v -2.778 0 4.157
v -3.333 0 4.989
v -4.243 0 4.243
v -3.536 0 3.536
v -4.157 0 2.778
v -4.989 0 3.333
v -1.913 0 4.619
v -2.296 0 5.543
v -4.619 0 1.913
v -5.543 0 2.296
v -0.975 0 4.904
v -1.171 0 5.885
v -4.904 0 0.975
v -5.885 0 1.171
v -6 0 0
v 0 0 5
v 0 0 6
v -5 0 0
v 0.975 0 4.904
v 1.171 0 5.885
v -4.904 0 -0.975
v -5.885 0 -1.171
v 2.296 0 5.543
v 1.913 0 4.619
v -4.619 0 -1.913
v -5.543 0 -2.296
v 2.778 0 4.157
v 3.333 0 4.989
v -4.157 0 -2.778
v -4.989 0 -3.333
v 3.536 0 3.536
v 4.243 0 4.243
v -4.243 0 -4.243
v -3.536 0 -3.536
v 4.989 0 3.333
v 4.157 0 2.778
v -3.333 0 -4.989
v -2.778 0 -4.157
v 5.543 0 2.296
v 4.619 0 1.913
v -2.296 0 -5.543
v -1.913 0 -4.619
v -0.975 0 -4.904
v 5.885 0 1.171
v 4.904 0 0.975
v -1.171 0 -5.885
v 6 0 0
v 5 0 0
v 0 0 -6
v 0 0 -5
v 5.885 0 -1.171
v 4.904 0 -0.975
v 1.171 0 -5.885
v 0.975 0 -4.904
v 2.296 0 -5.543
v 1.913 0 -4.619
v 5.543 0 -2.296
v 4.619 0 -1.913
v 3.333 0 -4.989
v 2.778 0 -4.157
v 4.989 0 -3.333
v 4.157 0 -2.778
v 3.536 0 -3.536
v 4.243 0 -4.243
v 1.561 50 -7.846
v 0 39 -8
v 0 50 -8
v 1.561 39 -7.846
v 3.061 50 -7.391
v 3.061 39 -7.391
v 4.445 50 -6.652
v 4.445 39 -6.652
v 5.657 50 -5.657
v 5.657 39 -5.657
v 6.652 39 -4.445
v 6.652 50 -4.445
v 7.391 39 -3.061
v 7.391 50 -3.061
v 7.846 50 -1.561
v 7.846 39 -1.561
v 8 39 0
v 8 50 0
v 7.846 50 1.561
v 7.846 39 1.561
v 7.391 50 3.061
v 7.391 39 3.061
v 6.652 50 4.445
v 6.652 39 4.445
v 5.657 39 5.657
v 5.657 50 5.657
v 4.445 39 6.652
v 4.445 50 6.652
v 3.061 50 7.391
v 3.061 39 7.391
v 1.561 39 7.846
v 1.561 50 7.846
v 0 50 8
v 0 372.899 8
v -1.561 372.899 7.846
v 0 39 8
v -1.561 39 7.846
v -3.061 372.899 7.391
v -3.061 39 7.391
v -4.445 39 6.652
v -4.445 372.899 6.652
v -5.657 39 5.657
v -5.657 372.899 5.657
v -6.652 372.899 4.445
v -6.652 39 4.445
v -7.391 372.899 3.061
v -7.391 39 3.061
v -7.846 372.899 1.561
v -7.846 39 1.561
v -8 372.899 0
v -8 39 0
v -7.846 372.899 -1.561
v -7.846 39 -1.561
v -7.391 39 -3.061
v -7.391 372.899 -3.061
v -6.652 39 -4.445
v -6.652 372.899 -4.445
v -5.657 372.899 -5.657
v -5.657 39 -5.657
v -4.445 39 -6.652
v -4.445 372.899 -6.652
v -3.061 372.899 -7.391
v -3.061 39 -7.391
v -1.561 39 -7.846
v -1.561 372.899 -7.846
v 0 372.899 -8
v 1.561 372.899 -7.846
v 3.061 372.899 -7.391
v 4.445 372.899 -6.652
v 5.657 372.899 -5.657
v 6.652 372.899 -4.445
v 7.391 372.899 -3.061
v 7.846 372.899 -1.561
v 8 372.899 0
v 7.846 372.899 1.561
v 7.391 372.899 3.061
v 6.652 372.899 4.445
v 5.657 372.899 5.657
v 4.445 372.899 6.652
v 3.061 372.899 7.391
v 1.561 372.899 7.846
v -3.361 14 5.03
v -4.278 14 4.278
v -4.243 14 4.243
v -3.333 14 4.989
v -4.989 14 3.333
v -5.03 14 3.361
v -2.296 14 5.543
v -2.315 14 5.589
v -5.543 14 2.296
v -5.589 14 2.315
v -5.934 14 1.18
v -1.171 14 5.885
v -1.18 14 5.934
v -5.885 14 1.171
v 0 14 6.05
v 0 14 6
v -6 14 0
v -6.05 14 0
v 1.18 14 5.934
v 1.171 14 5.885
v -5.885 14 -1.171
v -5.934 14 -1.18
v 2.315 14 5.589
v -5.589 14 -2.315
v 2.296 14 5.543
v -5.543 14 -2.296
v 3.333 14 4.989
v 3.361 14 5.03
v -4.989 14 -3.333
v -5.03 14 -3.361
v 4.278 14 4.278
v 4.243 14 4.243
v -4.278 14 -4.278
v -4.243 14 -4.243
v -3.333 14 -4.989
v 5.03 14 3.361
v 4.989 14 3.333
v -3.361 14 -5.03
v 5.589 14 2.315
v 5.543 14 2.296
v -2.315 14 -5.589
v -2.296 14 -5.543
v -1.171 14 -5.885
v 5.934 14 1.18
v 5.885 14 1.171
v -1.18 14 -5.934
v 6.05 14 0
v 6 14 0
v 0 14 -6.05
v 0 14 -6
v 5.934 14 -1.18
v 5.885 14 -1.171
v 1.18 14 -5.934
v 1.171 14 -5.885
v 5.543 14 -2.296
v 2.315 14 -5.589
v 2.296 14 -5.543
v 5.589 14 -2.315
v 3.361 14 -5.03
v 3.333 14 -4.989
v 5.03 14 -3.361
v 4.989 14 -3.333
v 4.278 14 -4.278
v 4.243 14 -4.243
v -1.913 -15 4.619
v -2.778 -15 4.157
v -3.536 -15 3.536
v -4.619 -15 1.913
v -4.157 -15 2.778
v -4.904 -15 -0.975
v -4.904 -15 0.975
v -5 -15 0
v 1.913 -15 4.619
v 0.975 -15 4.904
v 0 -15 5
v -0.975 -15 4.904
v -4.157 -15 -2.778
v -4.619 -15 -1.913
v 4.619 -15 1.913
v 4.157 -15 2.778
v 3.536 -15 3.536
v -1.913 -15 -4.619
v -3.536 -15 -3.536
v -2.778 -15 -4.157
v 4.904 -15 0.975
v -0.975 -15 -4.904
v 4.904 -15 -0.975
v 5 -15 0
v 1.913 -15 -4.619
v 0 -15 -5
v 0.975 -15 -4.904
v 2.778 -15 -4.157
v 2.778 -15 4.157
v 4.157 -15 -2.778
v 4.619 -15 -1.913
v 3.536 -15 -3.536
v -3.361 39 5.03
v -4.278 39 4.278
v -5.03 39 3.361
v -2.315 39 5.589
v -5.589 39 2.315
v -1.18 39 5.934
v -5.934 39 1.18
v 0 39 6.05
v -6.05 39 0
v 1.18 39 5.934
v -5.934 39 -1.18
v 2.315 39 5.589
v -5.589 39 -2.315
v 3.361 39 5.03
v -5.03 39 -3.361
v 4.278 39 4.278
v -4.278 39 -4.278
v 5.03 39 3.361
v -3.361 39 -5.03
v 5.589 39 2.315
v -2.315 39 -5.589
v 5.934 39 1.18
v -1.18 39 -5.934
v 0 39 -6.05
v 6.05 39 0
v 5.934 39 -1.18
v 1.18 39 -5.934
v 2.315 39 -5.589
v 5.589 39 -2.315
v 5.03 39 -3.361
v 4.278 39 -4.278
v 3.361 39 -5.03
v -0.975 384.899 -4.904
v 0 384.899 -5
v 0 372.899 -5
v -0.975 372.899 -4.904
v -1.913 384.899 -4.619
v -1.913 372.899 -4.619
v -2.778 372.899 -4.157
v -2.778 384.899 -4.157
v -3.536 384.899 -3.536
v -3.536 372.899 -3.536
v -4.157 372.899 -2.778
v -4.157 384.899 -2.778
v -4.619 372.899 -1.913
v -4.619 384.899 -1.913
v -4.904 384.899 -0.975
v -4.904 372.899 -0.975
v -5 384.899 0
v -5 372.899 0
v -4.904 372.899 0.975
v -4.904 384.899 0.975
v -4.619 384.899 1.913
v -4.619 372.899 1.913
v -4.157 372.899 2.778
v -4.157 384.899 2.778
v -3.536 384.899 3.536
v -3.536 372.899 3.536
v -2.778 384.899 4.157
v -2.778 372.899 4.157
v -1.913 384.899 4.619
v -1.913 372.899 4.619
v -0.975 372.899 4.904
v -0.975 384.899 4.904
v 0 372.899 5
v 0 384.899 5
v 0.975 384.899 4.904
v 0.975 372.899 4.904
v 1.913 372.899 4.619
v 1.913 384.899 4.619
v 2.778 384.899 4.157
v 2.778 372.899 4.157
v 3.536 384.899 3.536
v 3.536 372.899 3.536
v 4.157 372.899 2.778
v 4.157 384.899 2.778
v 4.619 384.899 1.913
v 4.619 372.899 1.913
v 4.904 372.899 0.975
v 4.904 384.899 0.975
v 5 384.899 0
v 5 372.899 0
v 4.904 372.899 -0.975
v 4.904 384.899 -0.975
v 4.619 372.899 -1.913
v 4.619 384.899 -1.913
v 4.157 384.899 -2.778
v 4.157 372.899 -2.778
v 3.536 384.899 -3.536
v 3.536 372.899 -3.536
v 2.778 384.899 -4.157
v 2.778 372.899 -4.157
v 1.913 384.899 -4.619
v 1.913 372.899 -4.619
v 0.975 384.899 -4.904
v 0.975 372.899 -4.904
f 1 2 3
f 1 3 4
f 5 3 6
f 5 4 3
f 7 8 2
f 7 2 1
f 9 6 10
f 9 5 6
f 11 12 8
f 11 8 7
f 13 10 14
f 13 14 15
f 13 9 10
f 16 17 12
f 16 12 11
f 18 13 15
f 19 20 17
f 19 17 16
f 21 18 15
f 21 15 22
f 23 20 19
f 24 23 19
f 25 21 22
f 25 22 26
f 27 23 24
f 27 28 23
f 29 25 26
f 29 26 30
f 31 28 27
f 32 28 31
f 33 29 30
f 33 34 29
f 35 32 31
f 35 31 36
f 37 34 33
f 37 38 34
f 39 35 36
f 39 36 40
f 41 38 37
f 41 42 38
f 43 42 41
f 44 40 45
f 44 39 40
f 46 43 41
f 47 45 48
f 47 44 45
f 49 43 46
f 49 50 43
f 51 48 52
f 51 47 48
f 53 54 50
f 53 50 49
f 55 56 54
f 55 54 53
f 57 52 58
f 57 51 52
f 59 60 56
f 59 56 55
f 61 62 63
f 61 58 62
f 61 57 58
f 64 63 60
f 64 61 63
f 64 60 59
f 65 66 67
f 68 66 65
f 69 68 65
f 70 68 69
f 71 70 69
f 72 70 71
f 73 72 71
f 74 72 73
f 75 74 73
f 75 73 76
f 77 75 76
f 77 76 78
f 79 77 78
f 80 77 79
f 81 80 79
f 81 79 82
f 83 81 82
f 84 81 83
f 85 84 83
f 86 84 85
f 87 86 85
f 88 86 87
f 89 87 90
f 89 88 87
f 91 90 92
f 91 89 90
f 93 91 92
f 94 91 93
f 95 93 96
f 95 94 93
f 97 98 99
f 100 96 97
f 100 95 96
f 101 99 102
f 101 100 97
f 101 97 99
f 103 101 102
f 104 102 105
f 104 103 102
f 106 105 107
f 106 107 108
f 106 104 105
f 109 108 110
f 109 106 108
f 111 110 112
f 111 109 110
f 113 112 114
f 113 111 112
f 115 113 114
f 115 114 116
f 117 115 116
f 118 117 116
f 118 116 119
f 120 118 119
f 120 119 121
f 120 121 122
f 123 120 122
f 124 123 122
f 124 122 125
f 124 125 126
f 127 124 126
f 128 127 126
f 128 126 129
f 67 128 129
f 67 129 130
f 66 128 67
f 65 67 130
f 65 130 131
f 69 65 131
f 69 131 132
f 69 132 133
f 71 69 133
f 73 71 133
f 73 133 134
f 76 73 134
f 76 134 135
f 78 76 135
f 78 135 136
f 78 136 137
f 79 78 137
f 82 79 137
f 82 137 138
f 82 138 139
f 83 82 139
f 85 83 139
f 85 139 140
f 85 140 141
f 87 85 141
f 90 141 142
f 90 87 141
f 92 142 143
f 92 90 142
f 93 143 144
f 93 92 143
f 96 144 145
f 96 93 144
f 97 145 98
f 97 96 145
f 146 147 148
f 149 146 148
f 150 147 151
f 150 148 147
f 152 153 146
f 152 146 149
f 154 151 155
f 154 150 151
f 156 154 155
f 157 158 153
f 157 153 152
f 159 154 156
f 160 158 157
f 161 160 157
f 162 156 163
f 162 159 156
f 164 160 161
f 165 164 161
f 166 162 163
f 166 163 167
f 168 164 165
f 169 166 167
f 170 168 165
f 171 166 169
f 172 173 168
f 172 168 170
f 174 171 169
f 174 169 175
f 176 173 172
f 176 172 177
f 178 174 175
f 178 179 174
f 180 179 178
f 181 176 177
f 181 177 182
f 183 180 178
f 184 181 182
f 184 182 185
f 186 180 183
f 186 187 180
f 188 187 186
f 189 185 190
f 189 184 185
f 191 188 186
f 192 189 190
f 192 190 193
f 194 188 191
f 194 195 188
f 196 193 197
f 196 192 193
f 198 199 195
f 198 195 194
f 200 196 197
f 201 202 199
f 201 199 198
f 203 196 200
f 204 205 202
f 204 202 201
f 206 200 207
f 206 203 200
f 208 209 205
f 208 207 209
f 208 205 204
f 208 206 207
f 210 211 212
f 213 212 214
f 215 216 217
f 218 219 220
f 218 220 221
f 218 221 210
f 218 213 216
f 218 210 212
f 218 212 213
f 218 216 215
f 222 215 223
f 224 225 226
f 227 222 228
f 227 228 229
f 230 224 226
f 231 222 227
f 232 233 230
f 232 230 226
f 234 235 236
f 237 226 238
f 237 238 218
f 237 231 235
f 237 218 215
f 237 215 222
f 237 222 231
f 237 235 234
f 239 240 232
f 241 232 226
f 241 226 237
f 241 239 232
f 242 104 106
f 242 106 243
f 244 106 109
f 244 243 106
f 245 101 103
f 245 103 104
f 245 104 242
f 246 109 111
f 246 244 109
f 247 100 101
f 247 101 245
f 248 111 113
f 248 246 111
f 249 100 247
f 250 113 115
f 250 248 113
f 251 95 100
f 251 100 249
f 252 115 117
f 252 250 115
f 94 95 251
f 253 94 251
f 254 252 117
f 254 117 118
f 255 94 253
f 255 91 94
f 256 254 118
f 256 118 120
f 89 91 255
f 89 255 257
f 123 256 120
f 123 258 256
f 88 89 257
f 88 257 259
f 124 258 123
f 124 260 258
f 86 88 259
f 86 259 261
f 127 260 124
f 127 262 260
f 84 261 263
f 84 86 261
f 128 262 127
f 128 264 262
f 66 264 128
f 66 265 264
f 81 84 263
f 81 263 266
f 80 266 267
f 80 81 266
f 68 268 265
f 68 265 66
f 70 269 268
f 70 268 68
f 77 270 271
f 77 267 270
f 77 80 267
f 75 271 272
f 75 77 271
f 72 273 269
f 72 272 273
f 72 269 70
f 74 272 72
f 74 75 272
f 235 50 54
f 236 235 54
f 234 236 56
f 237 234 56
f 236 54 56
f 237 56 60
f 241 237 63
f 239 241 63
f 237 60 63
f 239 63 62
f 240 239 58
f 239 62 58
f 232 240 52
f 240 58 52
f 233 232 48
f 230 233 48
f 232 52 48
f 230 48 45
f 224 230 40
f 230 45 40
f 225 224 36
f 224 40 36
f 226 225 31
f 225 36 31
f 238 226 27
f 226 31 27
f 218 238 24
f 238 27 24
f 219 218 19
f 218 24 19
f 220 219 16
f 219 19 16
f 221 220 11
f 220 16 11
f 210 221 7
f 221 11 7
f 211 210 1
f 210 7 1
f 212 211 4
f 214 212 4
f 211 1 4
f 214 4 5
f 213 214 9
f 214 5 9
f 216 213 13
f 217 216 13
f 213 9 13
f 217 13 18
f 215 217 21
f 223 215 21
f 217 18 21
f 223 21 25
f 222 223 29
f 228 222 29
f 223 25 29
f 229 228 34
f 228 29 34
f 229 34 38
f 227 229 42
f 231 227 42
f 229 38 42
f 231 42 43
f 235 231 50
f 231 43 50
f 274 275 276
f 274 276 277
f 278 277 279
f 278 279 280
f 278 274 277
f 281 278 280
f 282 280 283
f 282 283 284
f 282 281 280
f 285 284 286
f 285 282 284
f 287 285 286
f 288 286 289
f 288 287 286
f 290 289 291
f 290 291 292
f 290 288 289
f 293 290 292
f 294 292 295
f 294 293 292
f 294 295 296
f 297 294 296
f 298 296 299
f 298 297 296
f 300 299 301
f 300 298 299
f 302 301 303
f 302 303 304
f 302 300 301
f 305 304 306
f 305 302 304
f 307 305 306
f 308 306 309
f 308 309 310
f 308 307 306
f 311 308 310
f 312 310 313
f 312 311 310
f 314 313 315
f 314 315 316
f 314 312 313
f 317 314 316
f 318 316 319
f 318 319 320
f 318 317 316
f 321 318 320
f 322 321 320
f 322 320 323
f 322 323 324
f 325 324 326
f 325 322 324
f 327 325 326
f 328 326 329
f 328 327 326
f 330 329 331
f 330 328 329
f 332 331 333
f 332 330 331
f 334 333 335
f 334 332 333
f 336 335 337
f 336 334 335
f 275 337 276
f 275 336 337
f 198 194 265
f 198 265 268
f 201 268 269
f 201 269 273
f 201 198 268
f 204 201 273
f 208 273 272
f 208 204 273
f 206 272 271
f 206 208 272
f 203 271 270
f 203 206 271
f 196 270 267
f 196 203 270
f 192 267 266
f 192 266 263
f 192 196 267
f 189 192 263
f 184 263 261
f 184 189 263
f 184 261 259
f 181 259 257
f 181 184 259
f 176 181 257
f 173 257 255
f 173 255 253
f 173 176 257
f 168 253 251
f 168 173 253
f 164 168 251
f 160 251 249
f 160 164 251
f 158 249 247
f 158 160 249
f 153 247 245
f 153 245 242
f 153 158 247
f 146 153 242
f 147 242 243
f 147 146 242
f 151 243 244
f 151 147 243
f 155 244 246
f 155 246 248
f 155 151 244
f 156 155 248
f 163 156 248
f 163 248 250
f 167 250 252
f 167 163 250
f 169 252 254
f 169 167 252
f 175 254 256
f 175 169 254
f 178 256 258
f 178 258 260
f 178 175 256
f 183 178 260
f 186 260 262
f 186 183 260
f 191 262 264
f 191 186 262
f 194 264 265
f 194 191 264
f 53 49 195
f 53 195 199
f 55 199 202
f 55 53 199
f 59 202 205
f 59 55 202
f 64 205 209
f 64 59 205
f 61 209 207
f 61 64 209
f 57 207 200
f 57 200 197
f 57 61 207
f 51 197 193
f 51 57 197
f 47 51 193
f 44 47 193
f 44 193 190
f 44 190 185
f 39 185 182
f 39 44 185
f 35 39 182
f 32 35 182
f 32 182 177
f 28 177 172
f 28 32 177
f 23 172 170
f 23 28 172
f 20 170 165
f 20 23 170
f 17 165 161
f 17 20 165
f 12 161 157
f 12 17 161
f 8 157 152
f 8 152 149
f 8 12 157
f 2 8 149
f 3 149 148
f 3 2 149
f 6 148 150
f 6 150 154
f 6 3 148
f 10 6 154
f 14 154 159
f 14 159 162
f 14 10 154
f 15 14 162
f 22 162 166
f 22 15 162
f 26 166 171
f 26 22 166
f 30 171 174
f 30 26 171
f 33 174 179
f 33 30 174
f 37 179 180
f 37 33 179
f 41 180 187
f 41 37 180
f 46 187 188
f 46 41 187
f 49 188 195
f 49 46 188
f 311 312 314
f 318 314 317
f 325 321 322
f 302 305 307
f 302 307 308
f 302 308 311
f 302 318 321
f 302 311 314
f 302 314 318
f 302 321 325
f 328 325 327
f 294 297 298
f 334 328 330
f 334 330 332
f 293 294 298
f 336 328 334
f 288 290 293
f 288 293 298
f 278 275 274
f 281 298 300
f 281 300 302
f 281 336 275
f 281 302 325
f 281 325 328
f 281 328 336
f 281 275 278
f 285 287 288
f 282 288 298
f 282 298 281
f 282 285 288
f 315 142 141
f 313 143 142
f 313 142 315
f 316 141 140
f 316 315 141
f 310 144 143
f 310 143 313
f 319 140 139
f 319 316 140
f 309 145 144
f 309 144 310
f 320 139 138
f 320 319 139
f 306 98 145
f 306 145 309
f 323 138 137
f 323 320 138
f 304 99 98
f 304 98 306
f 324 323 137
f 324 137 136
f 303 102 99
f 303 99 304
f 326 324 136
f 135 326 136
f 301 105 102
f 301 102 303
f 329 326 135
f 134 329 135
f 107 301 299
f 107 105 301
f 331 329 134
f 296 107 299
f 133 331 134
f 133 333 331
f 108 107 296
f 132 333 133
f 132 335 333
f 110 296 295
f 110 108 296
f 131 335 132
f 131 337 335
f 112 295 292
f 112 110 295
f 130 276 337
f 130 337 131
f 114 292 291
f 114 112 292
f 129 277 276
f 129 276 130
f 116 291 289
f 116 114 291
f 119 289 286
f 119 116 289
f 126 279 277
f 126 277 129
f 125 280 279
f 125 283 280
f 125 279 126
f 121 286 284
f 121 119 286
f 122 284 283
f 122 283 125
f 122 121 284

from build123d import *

# Parameters (mm, degrees)
SKETCH1_R        = 8
EXTRUSION1_DEPTH = 400
SKETCH2_R        = 8
EXTRUSION2_DEPTH = 50
EXTRUSION3_START = 50
SKETCH3_R        = 8
EXTRUSION3_DEPTH = 50
SKETCH4_R        = 8
SKETCH4_R_2      = 6
THREAD1_DEPTH    = 14
SKETCH5_R        = 8
SKETCH5_R_2      = 6.05
EXTRUSION5_DEPTH = 25
SKETCH6_R        = 5
EXTRUSION6_DEPTH = 15
EXTRUSION7_START = -27.101
SKETCH7_R        = 8
EXTRUSION7_DEPTH = 27.101
EXTRUSION8_START = 12
SKETCH8_R        = 5
EXTRUSION8_DEPTH = 12


with BuildPart() as part:
    # Sketch1 → Extrusion1 (new body)
    with BuildSketch(Plane(origin=(0, 0, 0), x_dir=(-1, 0, 0), z_dir=(0, 1, 0))):
        with Locations(Location((0, 0, 0), (0, 0, 90))):
            Circle(SKETCH1_R)
    extrude(amount=EXTRUSION1_DEPTH)

    # Sketch2 → Extrusion2 (cut)
    with BuildSketch(Plane.XZ):
        with Locations(Location((0, 0, 0), (0, 0, 270))):
            Circle(SKETCH2_R)
    extrude(amount=-EXTRUSION2_DEPTH, mode=Mode.SUBTRACT)

    # Sketch3 → Extrusion3 (add)
    with BuildSketch(Plane.XZ.offset(-50).offset(EXTRUSION3_START)):
        with Locations(Location((0, 0, 0), (0, 0, 270))):
            Circle(SKETCH3_R)
    extrude(amount=-EXTRUSION3_DEPTH)

    # Sketch4 → Thread1 (cut)
    with BuildSketch(Plane.XZ):
        with Locations(Location((0, 0, 0), (0, 0, 270))):
            Circle(SKETCH4_R)
        with Locations(Location((0, 0, 0), (0, 0, 270))):
            Circle(SKETCH4_R_2, mode=Mode.SUBTRACT)
    extrude(amount=-THREAD1_DEPTH, mode=Mode.SUBTRACT)

    # Sketch5 → Extrusion5 (cut)
    with BuildSketch(Plane.XZ.offset(-14)):
        with Locations(Location((0, 0, 0), (0, 0, 270))):
            Circle(SKETCH5_R)
        with Locations(Location((0, 0, 0), (0, 0, 270))):
            Circle(SKETCH5_R_2, mode=Mode.SUBTRACT)
    extrude(amount=-EXTRUSION5_DEPTH, mode=Mode.SUBTRACT)

    # Sketch6 → Extrusion6 (add)
    with BuildSketch(Plane.XZ):
        with Locations(Location((0, 0, 0), (0, 0, 270))):
            Circle(SKETCH6_R)
    extrude(amount=EXTRUSION6_DEPTH)

    # Sketch7 → Extrusion7 (cut)
    with BuildSketch(Plane(origin=(0, 400, 0), x_dir=(-1, 0, 0), z_dir=(0, 1, 0)).offset(EXTRUSION7_START)):
        with Locations(Location((0, 0, 0), (0, 0, 270))):
            Circle(SKETCH7_R)
    extrude(amount=EXTRUSION7_DEPTH, mode=Mode.SUBTRACT)

    # Sketch8 → Extrusion8 (add)
    with BuildSketch(Plane(origin=(0, 372.899, 0), x_dir=(-1, 0, 0), z_dir=(0, 1, 0)).offset(EXTRUSION8_START)):
        with Locations(Location((0, 0, 0), (0, 0, 270))):
            Circle(SKETCH8_R)
    extrude(amount=-EXTRUSION8_DEPTH)


solid = part.part
